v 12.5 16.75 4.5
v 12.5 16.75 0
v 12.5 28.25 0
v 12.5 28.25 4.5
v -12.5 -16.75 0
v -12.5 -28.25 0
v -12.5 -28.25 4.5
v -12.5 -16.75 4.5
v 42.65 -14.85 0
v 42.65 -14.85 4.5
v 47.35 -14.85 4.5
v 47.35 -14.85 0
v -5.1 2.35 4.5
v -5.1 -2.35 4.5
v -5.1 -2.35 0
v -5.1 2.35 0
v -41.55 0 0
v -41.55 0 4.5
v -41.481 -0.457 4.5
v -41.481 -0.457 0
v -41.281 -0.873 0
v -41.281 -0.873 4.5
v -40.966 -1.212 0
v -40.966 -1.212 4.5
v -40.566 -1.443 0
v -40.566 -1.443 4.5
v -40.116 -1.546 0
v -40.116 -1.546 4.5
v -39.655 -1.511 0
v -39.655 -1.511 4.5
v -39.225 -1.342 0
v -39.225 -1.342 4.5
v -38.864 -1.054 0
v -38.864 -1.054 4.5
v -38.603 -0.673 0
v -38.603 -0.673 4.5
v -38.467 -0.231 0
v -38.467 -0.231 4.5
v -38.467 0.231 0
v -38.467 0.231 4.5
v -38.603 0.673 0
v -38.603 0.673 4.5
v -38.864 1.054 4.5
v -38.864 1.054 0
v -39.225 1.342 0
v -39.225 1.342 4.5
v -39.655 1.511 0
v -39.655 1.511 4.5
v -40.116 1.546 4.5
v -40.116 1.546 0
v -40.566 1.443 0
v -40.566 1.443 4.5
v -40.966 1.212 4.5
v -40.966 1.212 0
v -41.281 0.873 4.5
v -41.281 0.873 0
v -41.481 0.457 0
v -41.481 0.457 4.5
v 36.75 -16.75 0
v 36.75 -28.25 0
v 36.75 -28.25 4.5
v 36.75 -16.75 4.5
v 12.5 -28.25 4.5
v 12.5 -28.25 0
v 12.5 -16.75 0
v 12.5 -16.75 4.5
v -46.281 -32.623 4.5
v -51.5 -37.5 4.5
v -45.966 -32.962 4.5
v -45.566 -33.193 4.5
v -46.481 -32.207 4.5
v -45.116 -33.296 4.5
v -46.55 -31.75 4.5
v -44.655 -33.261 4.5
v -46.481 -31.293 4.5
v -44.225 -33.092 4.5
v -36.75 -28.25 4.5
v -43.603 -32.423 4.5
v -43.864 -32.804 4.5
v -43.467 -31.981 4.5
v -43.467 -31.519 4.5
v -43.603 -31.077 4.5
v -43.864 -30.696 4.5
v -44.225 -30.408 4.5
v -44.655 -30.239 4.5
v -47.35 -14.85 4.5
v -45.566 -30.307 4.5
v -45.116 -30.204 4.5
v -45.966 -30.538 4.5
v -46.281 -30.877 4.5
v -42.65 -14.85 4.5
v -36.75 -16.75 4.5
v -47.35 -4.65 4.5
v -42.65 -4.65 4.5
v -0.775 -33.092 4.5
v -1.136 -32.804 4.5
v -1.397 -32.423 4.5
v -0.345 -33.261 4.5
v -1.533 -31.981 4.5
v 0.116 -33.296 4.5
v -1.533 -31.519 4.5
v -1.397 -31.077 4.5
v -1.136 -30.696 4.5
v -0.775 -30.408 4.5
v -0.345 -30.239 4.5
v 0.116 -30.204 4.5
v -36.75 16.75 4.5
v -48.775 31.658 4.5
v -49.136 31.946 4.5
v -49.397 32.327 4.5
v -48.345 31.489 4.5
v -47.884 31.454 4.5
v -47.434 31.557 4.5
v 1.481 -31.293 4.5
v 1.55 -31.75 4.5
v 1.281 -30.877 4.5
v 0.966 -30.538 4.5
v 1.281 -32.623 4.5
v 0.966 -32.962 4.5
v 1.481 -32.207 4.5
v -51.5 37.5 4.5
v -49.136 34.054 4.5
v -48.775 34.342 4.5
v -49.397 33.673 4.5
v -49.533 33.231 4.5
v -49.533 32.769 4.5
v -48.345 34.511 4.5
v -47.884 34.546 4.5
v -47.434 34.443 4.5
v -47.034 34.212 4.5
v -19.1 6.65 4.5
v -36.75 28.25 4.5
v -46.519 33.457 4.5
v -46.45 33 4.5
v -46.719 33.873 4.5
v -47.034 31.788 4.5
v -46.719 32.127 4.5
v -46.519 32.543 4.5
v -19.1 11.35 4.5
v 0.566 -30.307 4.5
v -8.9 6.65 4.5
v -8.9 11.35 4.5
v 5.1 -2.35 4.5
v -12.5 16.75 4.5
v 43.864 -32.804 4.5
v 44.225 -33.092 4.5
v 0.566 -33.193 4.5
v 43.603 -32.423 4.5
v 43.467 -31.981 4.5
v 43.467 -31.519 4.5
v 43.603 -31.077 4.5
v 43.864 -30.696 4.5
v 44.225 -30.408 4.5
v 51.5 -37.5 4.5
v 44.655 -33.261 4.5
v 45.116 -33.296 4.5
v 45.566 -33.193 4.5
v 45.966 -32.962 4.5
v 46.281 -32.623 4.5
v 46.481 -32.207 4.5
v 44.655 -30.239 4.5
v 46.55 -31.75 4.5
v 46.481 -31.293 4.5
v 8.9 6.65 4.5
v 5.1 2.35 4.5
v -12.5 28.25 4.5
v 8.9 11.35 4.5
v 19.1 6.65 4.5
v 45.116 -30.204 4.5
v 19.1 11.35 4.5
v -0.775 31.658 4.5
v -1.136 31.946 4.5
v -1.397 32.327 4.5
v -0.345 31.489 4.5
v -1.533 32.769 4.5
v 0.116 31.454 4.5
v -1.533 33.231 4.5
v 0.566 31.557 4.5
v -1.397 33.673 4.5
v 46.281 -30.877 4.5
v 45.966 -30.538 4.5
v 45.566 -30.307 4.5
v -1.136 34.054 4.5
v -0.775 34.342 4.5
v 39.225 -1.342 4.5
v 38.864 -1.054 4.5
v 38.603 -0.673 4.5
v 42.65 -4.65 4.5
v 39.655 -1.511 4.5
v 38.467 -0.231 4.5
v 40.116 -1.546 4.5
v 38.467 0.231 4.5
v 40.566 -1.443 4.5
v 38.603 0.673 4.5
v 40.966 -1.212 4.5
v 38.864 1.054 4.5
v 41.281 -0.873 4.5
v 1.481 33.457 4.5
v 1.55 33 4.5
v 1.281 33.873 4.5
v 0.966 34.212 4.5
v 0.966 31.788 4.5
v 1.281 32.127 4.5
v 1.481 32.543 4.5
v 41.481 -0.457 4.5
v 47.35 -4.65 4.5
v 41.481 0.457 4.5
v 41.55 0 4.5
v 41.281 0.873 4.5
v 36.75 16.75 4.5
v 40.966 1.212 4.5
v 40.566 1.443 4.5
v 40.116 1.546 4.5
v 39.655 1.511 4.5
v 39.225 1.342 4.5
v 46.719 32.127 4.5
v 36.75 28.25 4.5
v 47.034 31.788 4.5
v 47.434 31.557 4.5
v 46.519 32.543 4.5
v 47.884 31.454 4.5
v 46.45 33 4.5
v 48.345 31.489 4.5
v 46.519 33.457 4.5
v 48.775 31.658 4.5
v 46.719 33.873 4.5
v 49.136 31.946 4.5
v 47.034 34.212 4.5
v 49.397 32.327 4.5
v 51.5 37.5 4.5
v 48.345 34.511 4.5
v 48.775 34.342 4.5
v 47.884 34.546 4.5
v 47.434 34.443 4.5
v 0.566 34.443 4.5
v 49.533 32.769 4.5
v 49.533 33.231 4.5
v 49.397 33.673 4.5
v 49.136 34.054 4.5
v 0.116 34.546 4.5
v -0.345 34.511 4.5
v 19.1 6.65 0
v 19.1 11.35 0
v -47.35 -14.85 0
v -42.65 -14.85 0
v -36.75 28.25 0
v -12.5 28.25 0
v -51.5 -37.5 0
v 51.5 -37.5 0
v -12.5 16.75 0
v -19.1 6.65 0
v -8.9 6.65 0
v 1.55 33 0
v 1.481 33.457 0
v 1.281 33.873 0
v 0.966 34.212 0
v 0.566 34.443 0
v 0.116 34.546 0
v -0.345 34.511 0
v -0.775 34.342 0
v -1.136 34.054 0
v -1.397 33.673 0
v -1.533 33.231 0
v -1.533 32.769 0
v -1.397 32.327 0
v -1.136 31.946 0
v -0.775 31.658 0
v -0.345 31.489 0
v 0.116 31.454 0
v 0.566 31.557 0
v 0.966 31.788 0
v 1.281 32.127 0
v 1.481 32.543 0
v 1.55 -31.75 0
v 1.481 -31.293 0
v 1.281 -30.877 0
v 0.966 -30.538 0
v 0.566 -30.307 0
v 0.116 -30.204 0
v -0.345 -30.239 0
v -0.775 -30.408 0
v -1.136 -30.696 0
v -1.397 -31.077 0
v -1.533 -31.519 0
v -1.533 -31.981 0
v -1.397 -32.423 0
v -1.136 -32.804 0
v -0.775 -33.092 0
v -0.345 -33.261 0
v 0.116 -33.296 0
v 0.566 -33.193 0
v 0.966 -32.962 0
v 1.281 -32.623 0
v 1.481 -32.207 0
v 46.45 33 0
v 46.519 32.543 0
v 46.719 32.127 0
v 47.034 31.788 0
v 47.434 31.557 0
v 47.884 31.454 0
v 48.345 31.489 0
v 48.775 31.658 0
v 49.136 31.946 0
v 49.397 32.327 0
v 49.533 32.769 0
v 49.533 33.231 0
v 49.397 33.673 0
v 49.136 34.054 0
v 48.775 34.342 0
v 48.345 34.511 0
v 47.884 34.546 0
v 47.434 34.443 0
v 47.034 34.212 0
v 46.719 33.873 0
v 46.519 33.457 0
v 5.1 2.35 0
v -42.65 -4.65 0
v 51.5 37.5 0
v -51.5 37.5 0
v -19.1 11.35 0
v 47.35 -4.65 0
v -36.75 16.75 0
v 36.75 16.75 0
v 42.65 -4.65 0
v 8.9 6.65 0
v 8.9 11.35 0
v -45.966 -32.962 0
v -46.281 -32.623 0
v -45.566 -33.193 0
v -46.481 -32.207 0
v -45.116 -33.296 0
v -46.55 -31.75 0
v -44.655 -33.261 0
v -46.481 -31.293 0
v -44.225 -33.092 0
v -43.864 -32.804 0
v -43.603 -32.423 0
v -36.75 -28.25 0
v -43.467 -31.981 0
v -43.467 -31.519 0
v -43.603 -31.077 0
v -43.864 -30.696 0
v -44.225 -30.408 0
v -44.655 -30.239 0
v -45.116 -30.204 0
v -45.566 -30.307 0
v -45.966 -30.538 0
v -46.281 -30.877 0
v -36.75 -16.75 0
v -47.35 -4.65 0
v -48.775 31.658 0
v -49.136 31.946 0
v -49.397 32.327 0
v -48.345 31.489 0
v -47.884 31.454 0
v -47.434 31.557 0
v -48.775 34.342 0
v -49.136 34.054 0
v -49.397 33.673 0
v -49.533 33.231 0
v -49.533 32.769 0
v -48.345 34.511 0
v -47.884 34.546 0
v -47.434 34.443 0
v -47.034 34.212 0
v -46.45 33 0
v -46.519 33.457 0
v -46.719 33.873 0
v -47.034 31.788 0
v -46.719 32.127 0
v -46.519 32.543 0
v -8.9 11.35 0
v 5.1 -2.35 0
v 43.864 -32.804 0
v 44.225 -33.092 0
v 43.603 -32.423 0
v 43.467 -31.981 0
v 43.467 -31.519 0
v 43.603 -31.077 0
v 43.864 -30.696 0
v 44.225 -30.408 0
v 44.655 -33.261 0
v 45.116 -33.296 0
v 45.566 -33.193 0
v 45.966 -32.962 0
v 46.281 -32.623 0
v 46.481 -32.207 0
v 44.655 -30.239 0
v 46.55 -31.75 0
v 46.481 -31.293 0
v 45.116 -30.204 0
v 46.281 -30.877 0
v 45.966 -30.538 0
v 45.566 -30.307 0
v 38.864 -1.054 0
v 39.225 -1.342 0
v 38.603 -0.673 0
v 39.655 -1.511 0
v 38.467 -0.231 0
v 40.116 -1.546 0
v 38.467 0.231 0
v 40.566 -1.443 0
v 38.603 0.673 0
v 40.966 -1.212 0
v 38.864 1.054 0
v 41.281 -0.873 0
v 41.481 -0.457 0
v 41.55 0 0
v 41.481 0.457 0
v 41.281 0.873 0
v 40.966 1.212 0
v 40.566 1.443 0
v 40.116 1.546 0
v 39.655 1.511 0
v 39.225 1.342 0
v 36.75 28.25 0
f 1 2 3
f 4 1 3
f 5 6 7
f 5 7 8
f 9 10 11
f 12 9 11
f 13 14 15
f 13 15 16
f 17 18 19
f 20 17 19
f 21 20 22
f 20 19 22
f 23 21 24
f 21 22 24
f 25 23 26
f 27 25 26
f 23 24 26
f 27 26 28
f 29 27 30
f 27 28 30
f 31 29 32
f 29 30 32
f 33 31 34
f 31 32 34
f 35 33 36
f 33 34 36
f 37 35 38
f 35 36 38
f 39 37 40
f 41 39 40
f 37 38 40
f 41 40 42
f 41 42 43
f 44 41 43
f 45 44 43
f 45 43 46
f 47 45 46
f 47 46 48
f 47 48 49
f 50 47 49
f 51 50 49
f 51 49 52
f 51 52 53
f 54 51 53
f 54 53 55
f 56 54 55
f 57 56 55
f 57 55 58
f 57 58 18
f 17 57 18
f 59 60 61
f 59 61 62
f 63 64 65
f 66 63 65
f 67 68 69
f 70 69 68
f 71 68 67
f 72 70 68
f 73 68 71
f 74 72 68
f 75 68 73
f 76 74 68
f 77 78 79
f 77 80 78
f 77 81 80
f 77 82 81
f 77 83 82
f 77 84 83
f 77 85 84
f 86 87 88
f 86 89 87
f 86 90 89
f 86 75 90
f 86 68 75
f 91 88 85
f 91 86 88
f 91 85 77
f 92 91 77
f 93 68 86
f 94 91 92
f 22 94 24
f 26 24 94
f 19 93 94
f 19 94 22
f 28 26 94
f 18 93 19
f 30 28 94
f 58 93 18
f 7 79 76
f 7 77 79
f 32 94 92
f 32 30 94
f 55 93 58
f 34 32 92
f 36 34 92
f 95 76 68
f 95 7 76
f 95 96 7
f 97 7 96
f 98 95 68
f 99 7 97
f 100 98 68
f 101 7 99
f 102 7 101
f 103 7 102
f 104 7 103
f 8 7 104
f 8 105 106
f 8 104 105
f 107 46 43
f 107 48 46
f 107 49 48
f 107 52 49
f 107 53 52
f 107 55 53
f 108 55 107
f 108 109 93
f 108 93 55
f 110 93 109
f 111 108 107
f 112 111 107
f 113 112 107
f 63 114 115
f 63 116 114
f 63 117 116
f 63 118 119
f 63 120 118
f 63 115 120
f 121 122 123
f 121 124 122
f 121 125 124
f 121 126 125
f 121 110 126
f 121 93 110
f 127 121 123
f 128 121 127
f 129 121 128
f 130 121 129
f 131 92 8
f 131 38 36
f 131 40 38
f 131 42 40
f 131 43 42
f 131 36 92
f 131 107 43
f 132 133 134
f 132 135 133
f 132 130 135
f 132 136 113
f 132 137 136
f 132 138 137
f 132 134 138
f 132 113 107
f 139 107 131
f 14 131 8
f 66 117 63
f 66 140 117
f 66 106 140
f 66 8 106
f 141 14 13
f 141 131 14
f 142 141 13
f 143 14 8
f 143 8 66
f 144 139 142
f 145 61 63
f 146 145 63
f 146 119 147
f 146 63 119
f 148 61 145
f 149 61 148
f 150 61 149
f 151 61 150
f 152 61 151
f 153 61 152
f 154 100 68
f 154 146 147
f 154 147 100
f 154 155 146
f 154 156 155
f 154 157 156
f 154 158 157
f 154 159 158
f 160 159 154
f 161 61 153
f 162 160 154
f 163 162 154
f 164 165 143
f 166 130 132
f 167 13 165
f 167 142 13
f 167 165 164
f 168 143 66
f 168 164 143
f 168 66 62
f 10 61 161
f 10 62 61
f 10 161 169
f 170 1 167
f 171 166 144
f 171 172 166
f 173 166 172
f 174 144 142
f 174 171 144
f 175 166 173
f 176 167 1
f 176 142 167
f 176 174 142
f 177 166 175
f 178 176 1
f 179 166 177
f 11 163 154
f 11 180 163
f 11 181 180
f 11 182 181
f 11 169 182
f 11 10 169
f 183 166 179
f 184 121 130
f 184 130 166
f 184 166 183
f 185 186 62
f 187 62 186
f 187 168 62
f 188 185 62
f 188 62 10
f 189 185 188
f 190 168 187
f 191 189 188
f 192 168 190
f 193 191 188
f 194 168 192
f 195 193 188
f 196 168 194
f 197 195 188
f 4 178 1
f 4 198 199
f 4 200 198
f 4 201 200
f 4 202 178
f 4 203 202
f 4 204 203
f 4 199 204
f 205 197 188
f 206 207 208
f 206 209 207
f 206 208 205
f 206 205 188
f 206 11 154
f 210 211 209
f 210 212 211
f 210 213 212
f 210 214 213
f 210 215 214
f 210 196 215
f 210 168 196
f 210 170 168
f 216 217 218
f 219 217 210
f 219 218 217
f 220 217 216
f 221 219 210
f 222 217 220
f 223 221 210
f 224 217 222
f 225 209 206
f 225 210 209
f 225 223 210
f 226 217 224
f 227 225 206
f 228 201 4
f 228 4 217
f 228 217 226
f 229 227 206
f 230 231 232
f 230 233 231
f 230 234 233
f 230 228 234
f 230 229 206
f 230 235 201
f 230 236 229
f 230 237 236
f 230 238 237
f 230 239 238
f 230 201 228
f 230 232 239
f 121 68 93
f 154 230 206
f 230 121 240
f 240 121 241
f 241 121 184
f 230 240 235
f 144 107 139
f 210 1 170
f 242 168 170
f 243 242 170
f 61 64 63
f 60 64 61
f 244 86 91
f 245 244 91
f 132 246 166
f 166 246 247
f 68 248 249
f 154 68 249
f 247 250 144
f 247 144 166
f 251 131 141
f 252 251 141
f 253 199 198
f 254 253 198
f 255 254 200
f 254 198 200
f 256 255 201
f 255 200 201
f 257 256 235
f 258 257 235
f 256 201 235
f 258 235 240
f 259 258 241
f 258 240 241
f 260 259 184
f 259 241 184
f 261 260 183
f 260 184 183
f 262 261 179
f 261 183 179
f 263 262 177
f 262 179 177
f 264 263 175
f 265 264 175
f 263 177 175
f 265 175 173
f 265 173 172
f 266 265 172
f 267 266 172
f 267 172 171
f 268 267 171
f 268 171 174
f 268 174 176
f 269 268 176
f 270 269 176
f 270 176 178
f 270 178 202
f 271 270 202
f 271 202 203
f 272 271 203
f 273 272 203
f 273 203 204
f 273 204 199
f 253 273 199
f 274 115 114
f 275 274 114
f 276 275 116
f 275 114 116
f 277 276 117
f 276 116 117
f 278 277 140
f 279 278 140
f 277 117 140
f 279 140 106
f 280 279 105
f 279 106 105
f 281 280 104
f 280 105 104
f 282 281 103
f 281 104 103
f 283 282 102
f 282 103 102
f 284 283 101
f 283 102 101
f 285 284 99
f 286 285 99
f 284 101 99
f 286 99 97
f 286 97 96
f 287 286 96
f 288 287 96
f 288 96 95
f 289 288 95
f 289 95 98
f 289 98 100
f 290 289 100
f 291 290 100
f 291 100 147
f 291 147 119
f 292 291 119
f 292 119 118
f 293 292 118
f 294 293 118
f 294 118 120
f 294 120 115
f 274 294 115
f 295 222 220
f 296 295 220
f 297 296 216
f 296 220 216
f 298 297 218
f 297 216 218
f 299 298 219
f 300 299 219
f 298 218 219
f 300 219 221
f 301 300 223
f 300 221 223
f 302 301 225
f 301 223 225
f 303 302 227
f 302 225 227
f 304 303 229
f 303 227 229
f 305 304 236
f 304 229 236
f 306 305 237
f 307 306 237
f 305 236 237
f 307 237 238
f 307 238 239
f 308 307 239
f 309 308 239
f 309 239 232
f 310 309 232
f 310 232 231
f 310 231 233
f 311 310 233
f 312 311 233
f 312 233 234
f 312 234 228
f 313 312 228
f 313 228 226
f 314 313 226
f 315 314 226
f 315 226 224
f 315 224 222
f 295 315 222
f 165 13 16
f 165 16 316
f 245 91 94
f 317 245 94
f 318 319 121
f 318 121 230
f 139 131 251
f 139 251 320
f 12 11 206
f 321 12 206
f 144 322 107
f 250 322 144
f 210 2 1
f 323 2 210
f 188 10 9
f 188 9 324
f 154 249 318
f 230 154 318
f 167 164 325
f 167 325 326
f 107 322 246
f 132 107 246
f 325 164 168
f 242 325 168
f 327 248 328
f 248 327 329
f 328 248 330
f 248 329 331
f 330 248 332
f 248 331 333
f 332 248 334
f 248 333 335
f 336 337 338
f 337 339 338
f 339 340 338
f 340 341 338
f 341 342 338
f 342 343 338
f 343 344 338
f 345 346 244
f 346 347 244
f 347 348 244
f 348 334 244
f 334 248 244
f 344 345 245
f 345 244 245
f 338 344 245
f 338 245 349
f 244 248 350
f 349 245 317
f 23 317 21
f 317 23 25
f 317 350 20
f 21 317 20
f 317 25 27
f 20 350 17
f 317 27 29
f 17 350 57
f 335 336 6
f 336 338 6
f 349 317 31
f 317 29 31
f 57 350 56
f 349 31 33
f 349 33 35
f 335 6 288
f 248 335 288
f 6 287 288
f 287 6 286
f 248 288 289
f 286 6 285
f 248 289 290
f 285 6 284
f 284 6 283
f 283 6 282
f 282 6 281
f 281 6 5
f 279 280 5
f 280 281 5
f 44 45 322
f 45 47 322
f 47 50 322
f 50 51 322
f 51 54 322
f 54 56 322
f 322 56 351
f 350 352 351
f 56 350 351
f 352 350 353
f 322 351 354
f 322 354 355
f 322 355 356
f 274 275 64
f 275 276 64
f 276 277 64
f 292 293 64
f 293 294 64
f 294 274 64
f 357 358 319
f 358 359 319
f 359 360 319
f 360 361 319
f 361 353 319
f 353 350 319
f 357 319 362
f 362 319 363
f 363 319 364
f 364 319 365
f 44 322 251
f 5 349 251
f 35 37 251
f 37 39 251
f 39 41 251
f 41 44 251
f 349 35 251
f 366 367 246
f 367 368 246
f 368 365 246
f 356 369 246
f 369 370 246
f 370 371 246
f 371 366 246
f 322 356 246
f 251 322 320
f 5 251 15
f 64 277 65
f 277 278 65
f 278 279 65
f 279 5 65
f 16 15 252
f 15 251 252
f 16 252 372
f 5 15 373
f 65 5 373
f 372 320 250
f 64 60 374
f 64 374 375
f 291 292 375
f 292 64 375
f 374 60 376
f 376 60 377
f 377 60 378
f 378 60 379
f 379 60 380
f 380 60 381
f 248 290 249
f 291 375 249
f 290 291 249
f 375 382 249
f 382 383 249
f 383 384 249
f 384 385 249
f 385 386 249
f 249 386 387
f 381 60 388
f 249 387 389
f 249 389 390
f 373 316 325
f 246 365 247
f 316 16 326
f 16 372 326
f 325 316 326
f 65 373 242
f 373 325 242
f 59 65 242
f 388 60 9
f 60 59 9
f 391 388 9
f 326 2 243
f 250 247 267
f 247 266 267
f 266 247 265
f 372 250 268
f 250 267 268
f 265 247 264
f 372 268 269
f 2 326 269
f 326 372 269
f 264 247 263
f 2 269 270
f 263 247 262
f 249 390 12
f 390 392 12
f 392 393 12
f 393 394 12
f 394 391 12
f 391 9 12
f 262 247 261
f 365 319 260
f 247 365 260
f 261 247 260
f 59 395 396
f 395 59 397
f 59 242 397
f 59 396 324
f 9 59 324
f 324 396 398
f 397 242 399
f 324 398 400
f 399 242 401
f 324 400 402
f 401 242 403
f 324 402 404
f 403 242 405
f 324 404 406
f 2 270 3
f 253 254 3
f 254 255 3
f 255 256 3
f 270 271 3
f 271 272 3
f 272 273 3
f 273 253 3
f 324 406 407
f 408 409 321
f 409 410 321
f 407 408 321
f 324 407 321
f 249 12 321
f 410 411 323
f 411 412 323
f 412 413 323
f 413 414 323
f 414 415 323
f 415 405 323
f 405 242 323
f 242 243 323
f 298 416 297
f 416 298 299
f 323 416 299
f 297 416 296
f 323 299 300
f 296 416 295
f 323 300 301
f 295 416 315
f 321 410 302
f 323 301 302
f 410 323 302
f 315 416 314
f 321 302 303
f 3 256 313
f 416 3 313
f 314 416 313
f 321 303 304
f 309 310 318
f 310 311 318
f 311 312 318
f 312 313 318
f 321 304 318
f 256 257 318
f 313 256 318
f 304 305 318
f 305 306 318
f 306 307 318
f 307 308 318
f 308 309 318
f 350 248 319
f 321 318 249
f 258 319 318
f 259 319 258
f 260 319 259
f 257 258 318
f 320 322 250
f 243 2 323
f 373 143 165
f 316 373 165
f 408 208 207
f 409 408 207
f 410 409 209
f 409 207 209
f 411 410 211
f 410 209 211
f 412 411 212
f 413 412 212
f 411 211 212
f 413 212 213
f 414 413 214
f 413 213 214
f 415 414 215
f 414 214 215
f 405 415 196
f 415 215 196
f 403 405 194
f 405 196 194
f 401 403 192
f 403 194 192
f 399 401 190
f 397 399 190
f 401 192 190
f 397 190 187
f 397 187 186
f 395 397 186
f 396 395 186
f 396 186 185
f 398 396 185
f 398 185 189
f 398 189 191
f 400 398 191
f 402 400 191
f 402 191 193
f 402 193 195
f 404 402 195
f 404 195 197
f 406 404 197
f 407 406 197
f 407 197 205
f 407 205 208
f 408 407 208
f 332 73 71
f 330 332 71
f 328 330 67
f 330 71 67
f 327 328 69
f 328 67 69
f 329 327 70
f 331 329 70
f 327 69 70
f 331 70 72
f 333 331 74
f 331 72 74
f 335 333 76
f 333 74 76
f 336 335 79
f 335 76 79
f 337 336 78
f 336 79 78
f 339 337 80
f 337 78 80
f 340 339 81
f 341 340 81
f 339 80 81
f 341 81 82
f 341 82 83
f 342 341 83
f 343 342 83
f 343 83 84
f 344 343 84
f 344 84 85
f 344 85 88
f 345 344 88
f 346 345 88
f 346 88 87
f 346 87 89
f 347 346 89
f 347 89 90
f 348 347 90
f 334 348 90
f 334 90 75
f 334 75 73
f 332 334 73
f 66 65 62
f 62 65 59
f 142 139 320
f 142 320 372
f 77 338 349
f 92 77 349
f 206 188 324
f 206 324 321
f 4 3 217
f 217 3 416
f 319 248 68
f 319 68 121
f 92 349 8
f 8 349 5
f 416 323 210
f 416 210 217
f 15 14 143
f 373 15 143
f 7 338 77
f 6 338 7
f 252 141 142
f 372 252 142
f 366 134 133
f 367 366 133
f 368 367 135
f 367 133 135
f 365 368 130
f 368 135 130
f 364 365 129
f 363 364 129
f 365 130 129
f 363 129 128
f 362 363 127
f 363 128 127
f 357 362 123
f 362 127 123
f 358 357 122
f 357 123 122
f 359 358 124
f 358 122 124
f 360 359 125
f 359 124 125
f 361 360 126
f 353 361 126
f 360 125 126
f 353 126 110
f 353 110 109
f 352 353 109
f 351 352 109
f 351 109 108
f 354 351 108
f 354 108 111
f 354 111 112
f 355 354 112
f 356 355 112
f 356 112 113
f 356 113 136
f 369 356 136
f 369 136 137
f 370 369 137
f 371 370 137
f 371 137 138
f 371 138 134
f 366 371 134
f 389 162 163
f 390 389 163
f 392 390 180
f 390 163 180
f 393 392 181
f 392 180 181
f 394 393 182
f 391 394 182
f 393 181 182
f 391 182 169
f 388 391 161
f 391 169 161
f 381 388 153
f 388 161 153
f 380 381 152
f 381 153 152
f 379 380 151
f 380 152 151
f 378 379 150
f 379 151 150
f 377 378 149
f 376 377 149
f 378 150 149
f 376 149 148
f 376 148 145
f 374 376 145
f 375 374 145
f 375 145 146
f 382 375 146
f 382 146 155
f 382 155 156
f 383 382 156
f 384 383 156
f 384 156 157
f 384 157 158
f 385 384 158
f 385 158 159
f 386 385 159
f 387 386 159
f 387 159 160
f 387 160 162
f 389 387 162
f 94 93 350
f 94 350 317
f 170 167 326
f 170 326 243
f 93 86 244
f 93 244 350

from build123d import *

# Parameters (mm, degrees)
SKETCH1_W           = 103
SKETCH1_H           = 75
SKETCH1_W_2         = 24.25
SKETCH1_H_2         = 11.5
BOSS_EXTRUDE1_DEPTH = 4.5
SKETCH2_R           = 1.55
SCREWHOLES_DEPTH    = 64.865092187
SKETCH3_W           = 10.2
SKETCH3_H           = 4.7
BELTCLAMP_DEPTH     = 64.865092187
SKETCH4_W           = 10.2
SKETCH4_H           = 4.7
CUT_EXTRUDE3_DEPTH  = 64.865092187
SKETCH5_R           = 1.55
SKETCH5_W           = 4.7
SKETCH5_H           = 10.2
CUT_EXTRUDE4_DEPTH  = 64.865092187


with BuildPart() as part:
    # Sketch1 → Boss-Extrude1 (new body)
    with BuildSketch(Plane.XY):
        Rectangle(SKETCH1_W, SKETCH1_H)
        with Locations((-24.625, 22.5)):
            Rectangle(SKETCH1_W_2, SKETCH1_H_2, mode=Mode.SUBTRACT)
        with Locations((24.625, 22.5)):
            Rectangle(SKETCH1_W_2, SKETCH1_H_2, mode=Mode.SUBTRACT)
        with Locations((24.625, -22.5)):
            Rectangle(SKETCH1_W_2, SKETCH1_H_2, mode=Mode.SUBTRACT)
        with Locations((-24.625, -22.5)):
            Rectangle(SKETCH1_W_2, SKETCH1_H_2, mode=Mode.SUBTRACT)
    extrude(amount=BOSS_EXTRUDE1_DEPTH)

    # Sketch2 → screwHoles (cut, through all)
    with BuildSketch(Plane.XY.offset(4.5)):
        with Locations((-48, 33)):
            Circle(SKETCH2_R)
        with Locations(Location((48, 33, 0), (0, 0, 180))):
            Circle(SKETCH2_R)
        with Locations((40, 0)):
            Circle(SKETCH2_R)
        with Locations(Location((-40, 0, 0), (0, 0, 180))):
            Circle(SKETCH2_R)
        with Locations((0, 33)):
            Circle(SKETCH2_R)
    extrude(amount=-SCREWHOLES_DEPTH, mode=Mode.SUBTRACT)

    # Sketch3 → BeltClamp (cut, through all)
    with BuildSketch(Plane.XY.offset(4.5)):
        with Locations((-14, 9)):
            Rectangle(SKETCH3_W, SKETCH3_H)
        with Locations((14, 9)):
            Rectangle(SKETCH3_W, SKETCH3_H)
    extrude(amount=-BELTCLAMP_DEPTH, mode=Mode.SUBTRACT)

    # Sketch4 → Cut-Extrude3 (cut, through all)
    with BuildSketch(Plane.XY.offset(4.5)):
        Rectangle(SKETCH4_W, SKETCH4_H)
    extrude(amount=-CUT_EXTRUDE3_DEPTH, mode=Mode.SUBTRACT)

    # Sketch5 → Cut-Extrude4 (cut, through all)
    with BuildSketch(Plane.XY.offset(4.5)):
        with Locations((45, -31.75)):
            Circle(SKETCH5_R)
        with Locations(Location((-45, -31.75, 0), (0, 0, 180))):
            Circle(SKETCH5_R)
        with Locations((0, -31.75)):
            Circle(SKETCH5_R)
        with Locations((45, -9.75)):
            Rectangle(SKETCH5_W, SKETCH5_H)
        with Locations((-45, -9.75)):
            Rectangle(SKETCH5_W, SKETCH5_H)
    extrude(amount=-CUT_EXTRUDE4_DEPTH, mode=Mode.SUBTRACT)


solid = part.part
